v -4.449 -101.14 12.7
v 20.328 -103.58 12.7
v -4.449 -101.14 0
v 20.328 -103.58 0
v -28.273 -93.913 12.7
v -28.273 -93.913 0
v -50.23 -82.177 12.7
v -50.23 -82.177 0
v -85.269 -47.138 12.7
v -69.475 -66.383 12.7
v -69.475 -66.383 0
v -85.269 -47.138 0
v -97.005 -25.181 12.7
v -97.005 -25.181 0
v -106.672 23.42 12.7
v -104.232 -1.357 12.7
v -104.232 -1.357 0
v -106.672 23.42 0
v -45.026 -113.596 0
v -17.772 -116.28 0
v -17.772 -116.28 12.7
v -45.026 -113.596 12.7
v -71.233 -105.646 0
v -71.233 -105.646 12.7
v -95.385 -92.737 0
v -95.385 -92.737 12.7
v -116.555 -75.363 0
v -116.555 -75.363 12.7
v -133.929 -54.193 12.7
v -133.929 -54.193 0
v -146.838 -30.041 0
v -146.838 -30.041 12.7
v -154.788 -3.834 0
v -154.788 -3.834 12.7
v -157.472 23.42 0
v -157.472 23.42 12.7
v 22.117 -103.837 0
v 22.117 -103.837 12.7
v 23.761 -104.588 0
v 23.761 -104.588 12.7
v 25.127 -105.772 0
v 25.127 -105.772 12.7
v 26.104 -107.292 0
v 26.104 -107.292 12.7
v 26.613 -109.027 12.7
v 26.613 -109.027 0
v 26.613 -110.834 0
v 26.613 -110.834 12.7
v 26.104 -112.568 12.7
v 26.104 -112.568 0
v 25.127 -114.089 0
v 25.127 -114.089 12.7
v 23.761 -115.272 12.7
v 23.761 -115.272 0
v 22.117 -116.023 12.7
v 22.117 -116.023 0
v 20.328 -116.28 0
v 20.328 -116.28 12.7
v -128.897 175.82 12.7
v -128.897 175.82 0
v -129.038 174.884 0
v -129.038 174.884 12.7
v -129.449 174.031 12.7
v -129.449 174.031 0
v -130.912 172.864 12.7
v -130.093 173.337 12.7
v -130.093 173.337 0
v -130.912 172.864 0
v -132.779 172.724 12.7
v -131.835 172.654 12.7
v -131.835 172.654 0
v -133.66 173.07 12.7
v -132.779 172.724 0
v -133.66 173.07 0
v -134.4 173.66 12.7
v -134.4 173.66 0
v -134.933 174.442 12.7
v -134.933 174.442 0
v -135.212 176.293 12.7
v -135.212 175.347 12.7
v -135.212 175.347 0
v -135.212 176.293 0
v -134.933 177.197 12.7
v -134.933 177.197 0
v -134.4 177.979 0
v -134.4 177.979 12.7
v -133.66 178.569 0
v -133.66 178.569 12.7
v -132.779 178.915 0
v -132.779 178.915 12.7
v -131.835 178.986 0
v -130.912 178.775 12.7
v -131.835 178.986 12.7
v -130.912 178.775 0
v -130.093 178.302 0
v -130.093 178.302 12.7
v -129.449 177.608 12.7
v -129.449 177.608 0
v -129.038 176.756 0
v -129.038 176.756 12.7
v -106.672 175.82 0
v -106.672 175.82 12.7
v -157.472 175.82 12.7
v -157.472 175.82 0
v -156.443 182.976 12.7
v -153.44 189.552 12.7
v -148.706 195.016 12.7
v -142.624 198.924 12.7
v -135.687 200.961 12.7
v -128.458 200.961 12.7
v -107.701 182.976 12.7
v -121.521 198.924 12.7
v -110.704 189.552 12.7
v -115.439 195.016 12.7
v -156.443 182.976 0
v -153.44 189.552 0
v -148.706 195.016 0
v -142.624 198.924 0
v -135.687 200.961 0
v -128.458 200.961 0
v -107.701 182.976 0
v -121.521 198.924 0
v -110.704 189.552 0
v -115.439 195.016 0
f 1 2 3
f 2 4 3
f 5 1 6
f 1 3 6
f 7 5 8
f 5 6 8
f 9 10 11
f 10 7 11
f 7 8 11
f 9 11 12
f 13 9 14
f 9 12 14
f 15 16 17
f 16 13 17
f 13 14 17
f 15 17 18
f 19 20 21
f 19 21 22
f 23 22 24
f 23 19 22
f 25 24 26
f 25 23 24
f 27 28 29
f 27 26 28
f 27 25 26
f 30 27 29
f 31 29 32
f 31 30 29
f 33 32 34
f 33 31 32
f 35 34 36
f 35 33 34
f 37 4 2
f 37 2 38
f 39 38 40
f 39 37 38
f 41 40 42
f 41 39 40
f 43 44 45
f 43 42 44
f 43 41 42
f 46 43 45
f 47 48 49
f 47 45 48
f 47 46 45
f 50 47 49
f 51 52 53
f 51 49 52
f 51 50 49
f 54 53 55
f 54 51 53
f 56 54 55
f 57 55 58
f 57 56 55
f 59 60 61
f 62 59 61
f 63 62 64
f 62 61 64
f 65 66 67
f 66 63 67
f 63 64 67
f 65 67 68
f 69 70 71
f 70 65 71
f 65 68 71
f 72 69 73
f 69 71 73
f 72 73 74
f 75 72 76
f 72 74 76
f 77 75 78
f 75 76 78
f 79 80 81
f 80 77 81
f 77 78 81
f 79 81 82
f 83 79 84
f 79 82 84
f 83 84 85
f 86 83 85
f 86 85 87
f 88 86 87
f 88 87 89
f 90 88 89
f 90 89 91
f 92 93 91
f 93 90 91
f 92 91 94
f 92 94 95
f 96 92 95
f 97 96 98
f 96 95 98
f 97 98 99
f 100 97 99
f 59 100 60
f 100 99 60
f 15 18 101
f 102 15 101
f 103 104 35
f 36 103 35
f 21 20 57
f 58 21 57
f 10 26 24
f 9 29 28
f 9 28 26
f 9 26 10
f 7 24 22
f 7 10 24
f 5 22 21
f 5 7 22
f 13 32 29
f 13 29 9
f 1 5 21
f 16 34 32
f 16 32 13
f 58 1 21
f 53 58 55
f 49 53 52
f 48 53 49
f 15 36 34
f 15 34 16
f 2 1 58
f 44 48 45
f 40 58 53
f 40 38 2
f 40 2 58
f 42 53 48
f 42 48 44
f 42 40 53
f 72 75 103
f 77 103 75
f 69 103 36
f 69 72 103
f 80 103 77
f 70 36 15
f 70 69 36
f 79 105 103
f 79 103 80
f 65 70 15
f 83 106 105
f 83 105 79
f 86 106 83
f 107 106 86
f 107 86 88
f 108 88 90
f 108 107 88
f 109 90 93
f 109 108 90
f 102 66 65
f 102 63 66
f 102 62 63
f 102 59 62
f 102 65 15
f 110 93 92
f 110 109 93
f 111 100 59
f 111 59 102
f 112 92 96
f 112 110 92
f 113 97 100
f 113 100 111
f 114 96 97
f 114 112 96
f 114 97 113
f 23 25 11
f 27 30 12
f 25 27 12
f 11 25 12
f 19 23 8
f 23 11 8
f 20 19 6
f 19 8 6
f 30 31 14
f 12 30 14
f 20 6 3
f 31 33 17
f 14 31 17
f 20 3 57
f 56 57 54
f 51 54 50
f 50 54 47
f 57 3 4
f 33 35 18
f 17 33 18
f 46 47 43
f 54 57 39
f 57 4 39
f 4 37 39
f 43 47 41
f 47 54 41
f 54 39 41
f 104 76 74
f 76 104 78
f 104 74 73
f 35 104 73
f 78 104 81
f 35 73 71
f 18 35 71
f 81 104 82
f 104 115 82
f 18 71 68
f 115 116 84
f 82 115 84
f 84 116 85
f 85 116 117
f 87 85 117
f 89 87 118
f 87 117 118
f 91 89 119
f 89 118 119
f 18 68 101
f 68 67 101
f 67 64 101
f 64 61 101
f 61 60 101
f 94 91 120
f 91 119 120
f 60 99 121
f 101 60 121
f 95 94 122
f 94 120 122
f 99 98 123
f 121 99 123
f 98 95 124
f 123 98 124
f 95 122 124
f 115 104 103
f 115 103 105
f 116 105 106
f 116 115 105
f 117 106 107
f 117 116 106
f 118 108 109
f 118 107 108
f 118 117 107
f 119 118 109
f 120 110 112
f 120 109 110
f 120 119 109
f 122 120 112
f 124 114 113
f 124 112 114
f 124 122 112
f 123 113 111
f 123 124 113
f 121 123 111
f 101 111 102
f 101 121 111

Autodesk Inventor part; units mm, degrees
ref_plane "YZ Plane" through (0, 0, 0) normal (1, 0, 0) x (0, 1, 0)
ref_plane "XZ Plane" through (0, 0, 0) normal (0, 1, 0) x (-1, 0, 0)
ref_plane "XY Plane" through (0, 0, 0) normal (0, 0, 1) x (1, 0, 0)
sketch "Sketch1" plane through (0, 0, 0) normal (0, 0, 1) x (1, 0, 0)
  circle A0 centre (-132.0723, 175.8198) radius 3.175
  arc A1 (-106.6723, 175.8198) -> (-157.4723, 175.8198) centre (-132.0723, 175.8198) ccw
  arc A2 (-106.6723, 23.4198) -> (20.3277, -103.5802) centre (20.3277, 23.4198) ccw
  arc A3 (-157.4723, 23.4198) -> (-17.7723, -116.2802) centre (-17.7723, 23.4198) ccw
  line L0 (-157.4723, 175.8198) -> (-157.4723, 23.4198)
  line L1 (-106.6723, 23.4198) -> (-106.6723, 175.8198)
  line L2 (-17.7723, -116.2802) -> (20.3277, -116.2802)
  arc A4 (20.3277, -116.2802) -> (20.3277, -103.5802) centre (20.3277, -109.9302) ccw
  dimension "d23" = 6.35
  dimension "d24" = 50.8
  dimension "d25" = 25.4
  dimension "d26" = 127
  dimension "d27" = 139.7
  dimension "d28" = 152.4
  dimension "d29" = 152.4
  dimension "d30" = 6.35
  dimension "d31" = 38.1
extrude "Extrusion2" add sketch "Sketch1" along normal blind 12.7
properties part number "Bottom IntakeBar"
